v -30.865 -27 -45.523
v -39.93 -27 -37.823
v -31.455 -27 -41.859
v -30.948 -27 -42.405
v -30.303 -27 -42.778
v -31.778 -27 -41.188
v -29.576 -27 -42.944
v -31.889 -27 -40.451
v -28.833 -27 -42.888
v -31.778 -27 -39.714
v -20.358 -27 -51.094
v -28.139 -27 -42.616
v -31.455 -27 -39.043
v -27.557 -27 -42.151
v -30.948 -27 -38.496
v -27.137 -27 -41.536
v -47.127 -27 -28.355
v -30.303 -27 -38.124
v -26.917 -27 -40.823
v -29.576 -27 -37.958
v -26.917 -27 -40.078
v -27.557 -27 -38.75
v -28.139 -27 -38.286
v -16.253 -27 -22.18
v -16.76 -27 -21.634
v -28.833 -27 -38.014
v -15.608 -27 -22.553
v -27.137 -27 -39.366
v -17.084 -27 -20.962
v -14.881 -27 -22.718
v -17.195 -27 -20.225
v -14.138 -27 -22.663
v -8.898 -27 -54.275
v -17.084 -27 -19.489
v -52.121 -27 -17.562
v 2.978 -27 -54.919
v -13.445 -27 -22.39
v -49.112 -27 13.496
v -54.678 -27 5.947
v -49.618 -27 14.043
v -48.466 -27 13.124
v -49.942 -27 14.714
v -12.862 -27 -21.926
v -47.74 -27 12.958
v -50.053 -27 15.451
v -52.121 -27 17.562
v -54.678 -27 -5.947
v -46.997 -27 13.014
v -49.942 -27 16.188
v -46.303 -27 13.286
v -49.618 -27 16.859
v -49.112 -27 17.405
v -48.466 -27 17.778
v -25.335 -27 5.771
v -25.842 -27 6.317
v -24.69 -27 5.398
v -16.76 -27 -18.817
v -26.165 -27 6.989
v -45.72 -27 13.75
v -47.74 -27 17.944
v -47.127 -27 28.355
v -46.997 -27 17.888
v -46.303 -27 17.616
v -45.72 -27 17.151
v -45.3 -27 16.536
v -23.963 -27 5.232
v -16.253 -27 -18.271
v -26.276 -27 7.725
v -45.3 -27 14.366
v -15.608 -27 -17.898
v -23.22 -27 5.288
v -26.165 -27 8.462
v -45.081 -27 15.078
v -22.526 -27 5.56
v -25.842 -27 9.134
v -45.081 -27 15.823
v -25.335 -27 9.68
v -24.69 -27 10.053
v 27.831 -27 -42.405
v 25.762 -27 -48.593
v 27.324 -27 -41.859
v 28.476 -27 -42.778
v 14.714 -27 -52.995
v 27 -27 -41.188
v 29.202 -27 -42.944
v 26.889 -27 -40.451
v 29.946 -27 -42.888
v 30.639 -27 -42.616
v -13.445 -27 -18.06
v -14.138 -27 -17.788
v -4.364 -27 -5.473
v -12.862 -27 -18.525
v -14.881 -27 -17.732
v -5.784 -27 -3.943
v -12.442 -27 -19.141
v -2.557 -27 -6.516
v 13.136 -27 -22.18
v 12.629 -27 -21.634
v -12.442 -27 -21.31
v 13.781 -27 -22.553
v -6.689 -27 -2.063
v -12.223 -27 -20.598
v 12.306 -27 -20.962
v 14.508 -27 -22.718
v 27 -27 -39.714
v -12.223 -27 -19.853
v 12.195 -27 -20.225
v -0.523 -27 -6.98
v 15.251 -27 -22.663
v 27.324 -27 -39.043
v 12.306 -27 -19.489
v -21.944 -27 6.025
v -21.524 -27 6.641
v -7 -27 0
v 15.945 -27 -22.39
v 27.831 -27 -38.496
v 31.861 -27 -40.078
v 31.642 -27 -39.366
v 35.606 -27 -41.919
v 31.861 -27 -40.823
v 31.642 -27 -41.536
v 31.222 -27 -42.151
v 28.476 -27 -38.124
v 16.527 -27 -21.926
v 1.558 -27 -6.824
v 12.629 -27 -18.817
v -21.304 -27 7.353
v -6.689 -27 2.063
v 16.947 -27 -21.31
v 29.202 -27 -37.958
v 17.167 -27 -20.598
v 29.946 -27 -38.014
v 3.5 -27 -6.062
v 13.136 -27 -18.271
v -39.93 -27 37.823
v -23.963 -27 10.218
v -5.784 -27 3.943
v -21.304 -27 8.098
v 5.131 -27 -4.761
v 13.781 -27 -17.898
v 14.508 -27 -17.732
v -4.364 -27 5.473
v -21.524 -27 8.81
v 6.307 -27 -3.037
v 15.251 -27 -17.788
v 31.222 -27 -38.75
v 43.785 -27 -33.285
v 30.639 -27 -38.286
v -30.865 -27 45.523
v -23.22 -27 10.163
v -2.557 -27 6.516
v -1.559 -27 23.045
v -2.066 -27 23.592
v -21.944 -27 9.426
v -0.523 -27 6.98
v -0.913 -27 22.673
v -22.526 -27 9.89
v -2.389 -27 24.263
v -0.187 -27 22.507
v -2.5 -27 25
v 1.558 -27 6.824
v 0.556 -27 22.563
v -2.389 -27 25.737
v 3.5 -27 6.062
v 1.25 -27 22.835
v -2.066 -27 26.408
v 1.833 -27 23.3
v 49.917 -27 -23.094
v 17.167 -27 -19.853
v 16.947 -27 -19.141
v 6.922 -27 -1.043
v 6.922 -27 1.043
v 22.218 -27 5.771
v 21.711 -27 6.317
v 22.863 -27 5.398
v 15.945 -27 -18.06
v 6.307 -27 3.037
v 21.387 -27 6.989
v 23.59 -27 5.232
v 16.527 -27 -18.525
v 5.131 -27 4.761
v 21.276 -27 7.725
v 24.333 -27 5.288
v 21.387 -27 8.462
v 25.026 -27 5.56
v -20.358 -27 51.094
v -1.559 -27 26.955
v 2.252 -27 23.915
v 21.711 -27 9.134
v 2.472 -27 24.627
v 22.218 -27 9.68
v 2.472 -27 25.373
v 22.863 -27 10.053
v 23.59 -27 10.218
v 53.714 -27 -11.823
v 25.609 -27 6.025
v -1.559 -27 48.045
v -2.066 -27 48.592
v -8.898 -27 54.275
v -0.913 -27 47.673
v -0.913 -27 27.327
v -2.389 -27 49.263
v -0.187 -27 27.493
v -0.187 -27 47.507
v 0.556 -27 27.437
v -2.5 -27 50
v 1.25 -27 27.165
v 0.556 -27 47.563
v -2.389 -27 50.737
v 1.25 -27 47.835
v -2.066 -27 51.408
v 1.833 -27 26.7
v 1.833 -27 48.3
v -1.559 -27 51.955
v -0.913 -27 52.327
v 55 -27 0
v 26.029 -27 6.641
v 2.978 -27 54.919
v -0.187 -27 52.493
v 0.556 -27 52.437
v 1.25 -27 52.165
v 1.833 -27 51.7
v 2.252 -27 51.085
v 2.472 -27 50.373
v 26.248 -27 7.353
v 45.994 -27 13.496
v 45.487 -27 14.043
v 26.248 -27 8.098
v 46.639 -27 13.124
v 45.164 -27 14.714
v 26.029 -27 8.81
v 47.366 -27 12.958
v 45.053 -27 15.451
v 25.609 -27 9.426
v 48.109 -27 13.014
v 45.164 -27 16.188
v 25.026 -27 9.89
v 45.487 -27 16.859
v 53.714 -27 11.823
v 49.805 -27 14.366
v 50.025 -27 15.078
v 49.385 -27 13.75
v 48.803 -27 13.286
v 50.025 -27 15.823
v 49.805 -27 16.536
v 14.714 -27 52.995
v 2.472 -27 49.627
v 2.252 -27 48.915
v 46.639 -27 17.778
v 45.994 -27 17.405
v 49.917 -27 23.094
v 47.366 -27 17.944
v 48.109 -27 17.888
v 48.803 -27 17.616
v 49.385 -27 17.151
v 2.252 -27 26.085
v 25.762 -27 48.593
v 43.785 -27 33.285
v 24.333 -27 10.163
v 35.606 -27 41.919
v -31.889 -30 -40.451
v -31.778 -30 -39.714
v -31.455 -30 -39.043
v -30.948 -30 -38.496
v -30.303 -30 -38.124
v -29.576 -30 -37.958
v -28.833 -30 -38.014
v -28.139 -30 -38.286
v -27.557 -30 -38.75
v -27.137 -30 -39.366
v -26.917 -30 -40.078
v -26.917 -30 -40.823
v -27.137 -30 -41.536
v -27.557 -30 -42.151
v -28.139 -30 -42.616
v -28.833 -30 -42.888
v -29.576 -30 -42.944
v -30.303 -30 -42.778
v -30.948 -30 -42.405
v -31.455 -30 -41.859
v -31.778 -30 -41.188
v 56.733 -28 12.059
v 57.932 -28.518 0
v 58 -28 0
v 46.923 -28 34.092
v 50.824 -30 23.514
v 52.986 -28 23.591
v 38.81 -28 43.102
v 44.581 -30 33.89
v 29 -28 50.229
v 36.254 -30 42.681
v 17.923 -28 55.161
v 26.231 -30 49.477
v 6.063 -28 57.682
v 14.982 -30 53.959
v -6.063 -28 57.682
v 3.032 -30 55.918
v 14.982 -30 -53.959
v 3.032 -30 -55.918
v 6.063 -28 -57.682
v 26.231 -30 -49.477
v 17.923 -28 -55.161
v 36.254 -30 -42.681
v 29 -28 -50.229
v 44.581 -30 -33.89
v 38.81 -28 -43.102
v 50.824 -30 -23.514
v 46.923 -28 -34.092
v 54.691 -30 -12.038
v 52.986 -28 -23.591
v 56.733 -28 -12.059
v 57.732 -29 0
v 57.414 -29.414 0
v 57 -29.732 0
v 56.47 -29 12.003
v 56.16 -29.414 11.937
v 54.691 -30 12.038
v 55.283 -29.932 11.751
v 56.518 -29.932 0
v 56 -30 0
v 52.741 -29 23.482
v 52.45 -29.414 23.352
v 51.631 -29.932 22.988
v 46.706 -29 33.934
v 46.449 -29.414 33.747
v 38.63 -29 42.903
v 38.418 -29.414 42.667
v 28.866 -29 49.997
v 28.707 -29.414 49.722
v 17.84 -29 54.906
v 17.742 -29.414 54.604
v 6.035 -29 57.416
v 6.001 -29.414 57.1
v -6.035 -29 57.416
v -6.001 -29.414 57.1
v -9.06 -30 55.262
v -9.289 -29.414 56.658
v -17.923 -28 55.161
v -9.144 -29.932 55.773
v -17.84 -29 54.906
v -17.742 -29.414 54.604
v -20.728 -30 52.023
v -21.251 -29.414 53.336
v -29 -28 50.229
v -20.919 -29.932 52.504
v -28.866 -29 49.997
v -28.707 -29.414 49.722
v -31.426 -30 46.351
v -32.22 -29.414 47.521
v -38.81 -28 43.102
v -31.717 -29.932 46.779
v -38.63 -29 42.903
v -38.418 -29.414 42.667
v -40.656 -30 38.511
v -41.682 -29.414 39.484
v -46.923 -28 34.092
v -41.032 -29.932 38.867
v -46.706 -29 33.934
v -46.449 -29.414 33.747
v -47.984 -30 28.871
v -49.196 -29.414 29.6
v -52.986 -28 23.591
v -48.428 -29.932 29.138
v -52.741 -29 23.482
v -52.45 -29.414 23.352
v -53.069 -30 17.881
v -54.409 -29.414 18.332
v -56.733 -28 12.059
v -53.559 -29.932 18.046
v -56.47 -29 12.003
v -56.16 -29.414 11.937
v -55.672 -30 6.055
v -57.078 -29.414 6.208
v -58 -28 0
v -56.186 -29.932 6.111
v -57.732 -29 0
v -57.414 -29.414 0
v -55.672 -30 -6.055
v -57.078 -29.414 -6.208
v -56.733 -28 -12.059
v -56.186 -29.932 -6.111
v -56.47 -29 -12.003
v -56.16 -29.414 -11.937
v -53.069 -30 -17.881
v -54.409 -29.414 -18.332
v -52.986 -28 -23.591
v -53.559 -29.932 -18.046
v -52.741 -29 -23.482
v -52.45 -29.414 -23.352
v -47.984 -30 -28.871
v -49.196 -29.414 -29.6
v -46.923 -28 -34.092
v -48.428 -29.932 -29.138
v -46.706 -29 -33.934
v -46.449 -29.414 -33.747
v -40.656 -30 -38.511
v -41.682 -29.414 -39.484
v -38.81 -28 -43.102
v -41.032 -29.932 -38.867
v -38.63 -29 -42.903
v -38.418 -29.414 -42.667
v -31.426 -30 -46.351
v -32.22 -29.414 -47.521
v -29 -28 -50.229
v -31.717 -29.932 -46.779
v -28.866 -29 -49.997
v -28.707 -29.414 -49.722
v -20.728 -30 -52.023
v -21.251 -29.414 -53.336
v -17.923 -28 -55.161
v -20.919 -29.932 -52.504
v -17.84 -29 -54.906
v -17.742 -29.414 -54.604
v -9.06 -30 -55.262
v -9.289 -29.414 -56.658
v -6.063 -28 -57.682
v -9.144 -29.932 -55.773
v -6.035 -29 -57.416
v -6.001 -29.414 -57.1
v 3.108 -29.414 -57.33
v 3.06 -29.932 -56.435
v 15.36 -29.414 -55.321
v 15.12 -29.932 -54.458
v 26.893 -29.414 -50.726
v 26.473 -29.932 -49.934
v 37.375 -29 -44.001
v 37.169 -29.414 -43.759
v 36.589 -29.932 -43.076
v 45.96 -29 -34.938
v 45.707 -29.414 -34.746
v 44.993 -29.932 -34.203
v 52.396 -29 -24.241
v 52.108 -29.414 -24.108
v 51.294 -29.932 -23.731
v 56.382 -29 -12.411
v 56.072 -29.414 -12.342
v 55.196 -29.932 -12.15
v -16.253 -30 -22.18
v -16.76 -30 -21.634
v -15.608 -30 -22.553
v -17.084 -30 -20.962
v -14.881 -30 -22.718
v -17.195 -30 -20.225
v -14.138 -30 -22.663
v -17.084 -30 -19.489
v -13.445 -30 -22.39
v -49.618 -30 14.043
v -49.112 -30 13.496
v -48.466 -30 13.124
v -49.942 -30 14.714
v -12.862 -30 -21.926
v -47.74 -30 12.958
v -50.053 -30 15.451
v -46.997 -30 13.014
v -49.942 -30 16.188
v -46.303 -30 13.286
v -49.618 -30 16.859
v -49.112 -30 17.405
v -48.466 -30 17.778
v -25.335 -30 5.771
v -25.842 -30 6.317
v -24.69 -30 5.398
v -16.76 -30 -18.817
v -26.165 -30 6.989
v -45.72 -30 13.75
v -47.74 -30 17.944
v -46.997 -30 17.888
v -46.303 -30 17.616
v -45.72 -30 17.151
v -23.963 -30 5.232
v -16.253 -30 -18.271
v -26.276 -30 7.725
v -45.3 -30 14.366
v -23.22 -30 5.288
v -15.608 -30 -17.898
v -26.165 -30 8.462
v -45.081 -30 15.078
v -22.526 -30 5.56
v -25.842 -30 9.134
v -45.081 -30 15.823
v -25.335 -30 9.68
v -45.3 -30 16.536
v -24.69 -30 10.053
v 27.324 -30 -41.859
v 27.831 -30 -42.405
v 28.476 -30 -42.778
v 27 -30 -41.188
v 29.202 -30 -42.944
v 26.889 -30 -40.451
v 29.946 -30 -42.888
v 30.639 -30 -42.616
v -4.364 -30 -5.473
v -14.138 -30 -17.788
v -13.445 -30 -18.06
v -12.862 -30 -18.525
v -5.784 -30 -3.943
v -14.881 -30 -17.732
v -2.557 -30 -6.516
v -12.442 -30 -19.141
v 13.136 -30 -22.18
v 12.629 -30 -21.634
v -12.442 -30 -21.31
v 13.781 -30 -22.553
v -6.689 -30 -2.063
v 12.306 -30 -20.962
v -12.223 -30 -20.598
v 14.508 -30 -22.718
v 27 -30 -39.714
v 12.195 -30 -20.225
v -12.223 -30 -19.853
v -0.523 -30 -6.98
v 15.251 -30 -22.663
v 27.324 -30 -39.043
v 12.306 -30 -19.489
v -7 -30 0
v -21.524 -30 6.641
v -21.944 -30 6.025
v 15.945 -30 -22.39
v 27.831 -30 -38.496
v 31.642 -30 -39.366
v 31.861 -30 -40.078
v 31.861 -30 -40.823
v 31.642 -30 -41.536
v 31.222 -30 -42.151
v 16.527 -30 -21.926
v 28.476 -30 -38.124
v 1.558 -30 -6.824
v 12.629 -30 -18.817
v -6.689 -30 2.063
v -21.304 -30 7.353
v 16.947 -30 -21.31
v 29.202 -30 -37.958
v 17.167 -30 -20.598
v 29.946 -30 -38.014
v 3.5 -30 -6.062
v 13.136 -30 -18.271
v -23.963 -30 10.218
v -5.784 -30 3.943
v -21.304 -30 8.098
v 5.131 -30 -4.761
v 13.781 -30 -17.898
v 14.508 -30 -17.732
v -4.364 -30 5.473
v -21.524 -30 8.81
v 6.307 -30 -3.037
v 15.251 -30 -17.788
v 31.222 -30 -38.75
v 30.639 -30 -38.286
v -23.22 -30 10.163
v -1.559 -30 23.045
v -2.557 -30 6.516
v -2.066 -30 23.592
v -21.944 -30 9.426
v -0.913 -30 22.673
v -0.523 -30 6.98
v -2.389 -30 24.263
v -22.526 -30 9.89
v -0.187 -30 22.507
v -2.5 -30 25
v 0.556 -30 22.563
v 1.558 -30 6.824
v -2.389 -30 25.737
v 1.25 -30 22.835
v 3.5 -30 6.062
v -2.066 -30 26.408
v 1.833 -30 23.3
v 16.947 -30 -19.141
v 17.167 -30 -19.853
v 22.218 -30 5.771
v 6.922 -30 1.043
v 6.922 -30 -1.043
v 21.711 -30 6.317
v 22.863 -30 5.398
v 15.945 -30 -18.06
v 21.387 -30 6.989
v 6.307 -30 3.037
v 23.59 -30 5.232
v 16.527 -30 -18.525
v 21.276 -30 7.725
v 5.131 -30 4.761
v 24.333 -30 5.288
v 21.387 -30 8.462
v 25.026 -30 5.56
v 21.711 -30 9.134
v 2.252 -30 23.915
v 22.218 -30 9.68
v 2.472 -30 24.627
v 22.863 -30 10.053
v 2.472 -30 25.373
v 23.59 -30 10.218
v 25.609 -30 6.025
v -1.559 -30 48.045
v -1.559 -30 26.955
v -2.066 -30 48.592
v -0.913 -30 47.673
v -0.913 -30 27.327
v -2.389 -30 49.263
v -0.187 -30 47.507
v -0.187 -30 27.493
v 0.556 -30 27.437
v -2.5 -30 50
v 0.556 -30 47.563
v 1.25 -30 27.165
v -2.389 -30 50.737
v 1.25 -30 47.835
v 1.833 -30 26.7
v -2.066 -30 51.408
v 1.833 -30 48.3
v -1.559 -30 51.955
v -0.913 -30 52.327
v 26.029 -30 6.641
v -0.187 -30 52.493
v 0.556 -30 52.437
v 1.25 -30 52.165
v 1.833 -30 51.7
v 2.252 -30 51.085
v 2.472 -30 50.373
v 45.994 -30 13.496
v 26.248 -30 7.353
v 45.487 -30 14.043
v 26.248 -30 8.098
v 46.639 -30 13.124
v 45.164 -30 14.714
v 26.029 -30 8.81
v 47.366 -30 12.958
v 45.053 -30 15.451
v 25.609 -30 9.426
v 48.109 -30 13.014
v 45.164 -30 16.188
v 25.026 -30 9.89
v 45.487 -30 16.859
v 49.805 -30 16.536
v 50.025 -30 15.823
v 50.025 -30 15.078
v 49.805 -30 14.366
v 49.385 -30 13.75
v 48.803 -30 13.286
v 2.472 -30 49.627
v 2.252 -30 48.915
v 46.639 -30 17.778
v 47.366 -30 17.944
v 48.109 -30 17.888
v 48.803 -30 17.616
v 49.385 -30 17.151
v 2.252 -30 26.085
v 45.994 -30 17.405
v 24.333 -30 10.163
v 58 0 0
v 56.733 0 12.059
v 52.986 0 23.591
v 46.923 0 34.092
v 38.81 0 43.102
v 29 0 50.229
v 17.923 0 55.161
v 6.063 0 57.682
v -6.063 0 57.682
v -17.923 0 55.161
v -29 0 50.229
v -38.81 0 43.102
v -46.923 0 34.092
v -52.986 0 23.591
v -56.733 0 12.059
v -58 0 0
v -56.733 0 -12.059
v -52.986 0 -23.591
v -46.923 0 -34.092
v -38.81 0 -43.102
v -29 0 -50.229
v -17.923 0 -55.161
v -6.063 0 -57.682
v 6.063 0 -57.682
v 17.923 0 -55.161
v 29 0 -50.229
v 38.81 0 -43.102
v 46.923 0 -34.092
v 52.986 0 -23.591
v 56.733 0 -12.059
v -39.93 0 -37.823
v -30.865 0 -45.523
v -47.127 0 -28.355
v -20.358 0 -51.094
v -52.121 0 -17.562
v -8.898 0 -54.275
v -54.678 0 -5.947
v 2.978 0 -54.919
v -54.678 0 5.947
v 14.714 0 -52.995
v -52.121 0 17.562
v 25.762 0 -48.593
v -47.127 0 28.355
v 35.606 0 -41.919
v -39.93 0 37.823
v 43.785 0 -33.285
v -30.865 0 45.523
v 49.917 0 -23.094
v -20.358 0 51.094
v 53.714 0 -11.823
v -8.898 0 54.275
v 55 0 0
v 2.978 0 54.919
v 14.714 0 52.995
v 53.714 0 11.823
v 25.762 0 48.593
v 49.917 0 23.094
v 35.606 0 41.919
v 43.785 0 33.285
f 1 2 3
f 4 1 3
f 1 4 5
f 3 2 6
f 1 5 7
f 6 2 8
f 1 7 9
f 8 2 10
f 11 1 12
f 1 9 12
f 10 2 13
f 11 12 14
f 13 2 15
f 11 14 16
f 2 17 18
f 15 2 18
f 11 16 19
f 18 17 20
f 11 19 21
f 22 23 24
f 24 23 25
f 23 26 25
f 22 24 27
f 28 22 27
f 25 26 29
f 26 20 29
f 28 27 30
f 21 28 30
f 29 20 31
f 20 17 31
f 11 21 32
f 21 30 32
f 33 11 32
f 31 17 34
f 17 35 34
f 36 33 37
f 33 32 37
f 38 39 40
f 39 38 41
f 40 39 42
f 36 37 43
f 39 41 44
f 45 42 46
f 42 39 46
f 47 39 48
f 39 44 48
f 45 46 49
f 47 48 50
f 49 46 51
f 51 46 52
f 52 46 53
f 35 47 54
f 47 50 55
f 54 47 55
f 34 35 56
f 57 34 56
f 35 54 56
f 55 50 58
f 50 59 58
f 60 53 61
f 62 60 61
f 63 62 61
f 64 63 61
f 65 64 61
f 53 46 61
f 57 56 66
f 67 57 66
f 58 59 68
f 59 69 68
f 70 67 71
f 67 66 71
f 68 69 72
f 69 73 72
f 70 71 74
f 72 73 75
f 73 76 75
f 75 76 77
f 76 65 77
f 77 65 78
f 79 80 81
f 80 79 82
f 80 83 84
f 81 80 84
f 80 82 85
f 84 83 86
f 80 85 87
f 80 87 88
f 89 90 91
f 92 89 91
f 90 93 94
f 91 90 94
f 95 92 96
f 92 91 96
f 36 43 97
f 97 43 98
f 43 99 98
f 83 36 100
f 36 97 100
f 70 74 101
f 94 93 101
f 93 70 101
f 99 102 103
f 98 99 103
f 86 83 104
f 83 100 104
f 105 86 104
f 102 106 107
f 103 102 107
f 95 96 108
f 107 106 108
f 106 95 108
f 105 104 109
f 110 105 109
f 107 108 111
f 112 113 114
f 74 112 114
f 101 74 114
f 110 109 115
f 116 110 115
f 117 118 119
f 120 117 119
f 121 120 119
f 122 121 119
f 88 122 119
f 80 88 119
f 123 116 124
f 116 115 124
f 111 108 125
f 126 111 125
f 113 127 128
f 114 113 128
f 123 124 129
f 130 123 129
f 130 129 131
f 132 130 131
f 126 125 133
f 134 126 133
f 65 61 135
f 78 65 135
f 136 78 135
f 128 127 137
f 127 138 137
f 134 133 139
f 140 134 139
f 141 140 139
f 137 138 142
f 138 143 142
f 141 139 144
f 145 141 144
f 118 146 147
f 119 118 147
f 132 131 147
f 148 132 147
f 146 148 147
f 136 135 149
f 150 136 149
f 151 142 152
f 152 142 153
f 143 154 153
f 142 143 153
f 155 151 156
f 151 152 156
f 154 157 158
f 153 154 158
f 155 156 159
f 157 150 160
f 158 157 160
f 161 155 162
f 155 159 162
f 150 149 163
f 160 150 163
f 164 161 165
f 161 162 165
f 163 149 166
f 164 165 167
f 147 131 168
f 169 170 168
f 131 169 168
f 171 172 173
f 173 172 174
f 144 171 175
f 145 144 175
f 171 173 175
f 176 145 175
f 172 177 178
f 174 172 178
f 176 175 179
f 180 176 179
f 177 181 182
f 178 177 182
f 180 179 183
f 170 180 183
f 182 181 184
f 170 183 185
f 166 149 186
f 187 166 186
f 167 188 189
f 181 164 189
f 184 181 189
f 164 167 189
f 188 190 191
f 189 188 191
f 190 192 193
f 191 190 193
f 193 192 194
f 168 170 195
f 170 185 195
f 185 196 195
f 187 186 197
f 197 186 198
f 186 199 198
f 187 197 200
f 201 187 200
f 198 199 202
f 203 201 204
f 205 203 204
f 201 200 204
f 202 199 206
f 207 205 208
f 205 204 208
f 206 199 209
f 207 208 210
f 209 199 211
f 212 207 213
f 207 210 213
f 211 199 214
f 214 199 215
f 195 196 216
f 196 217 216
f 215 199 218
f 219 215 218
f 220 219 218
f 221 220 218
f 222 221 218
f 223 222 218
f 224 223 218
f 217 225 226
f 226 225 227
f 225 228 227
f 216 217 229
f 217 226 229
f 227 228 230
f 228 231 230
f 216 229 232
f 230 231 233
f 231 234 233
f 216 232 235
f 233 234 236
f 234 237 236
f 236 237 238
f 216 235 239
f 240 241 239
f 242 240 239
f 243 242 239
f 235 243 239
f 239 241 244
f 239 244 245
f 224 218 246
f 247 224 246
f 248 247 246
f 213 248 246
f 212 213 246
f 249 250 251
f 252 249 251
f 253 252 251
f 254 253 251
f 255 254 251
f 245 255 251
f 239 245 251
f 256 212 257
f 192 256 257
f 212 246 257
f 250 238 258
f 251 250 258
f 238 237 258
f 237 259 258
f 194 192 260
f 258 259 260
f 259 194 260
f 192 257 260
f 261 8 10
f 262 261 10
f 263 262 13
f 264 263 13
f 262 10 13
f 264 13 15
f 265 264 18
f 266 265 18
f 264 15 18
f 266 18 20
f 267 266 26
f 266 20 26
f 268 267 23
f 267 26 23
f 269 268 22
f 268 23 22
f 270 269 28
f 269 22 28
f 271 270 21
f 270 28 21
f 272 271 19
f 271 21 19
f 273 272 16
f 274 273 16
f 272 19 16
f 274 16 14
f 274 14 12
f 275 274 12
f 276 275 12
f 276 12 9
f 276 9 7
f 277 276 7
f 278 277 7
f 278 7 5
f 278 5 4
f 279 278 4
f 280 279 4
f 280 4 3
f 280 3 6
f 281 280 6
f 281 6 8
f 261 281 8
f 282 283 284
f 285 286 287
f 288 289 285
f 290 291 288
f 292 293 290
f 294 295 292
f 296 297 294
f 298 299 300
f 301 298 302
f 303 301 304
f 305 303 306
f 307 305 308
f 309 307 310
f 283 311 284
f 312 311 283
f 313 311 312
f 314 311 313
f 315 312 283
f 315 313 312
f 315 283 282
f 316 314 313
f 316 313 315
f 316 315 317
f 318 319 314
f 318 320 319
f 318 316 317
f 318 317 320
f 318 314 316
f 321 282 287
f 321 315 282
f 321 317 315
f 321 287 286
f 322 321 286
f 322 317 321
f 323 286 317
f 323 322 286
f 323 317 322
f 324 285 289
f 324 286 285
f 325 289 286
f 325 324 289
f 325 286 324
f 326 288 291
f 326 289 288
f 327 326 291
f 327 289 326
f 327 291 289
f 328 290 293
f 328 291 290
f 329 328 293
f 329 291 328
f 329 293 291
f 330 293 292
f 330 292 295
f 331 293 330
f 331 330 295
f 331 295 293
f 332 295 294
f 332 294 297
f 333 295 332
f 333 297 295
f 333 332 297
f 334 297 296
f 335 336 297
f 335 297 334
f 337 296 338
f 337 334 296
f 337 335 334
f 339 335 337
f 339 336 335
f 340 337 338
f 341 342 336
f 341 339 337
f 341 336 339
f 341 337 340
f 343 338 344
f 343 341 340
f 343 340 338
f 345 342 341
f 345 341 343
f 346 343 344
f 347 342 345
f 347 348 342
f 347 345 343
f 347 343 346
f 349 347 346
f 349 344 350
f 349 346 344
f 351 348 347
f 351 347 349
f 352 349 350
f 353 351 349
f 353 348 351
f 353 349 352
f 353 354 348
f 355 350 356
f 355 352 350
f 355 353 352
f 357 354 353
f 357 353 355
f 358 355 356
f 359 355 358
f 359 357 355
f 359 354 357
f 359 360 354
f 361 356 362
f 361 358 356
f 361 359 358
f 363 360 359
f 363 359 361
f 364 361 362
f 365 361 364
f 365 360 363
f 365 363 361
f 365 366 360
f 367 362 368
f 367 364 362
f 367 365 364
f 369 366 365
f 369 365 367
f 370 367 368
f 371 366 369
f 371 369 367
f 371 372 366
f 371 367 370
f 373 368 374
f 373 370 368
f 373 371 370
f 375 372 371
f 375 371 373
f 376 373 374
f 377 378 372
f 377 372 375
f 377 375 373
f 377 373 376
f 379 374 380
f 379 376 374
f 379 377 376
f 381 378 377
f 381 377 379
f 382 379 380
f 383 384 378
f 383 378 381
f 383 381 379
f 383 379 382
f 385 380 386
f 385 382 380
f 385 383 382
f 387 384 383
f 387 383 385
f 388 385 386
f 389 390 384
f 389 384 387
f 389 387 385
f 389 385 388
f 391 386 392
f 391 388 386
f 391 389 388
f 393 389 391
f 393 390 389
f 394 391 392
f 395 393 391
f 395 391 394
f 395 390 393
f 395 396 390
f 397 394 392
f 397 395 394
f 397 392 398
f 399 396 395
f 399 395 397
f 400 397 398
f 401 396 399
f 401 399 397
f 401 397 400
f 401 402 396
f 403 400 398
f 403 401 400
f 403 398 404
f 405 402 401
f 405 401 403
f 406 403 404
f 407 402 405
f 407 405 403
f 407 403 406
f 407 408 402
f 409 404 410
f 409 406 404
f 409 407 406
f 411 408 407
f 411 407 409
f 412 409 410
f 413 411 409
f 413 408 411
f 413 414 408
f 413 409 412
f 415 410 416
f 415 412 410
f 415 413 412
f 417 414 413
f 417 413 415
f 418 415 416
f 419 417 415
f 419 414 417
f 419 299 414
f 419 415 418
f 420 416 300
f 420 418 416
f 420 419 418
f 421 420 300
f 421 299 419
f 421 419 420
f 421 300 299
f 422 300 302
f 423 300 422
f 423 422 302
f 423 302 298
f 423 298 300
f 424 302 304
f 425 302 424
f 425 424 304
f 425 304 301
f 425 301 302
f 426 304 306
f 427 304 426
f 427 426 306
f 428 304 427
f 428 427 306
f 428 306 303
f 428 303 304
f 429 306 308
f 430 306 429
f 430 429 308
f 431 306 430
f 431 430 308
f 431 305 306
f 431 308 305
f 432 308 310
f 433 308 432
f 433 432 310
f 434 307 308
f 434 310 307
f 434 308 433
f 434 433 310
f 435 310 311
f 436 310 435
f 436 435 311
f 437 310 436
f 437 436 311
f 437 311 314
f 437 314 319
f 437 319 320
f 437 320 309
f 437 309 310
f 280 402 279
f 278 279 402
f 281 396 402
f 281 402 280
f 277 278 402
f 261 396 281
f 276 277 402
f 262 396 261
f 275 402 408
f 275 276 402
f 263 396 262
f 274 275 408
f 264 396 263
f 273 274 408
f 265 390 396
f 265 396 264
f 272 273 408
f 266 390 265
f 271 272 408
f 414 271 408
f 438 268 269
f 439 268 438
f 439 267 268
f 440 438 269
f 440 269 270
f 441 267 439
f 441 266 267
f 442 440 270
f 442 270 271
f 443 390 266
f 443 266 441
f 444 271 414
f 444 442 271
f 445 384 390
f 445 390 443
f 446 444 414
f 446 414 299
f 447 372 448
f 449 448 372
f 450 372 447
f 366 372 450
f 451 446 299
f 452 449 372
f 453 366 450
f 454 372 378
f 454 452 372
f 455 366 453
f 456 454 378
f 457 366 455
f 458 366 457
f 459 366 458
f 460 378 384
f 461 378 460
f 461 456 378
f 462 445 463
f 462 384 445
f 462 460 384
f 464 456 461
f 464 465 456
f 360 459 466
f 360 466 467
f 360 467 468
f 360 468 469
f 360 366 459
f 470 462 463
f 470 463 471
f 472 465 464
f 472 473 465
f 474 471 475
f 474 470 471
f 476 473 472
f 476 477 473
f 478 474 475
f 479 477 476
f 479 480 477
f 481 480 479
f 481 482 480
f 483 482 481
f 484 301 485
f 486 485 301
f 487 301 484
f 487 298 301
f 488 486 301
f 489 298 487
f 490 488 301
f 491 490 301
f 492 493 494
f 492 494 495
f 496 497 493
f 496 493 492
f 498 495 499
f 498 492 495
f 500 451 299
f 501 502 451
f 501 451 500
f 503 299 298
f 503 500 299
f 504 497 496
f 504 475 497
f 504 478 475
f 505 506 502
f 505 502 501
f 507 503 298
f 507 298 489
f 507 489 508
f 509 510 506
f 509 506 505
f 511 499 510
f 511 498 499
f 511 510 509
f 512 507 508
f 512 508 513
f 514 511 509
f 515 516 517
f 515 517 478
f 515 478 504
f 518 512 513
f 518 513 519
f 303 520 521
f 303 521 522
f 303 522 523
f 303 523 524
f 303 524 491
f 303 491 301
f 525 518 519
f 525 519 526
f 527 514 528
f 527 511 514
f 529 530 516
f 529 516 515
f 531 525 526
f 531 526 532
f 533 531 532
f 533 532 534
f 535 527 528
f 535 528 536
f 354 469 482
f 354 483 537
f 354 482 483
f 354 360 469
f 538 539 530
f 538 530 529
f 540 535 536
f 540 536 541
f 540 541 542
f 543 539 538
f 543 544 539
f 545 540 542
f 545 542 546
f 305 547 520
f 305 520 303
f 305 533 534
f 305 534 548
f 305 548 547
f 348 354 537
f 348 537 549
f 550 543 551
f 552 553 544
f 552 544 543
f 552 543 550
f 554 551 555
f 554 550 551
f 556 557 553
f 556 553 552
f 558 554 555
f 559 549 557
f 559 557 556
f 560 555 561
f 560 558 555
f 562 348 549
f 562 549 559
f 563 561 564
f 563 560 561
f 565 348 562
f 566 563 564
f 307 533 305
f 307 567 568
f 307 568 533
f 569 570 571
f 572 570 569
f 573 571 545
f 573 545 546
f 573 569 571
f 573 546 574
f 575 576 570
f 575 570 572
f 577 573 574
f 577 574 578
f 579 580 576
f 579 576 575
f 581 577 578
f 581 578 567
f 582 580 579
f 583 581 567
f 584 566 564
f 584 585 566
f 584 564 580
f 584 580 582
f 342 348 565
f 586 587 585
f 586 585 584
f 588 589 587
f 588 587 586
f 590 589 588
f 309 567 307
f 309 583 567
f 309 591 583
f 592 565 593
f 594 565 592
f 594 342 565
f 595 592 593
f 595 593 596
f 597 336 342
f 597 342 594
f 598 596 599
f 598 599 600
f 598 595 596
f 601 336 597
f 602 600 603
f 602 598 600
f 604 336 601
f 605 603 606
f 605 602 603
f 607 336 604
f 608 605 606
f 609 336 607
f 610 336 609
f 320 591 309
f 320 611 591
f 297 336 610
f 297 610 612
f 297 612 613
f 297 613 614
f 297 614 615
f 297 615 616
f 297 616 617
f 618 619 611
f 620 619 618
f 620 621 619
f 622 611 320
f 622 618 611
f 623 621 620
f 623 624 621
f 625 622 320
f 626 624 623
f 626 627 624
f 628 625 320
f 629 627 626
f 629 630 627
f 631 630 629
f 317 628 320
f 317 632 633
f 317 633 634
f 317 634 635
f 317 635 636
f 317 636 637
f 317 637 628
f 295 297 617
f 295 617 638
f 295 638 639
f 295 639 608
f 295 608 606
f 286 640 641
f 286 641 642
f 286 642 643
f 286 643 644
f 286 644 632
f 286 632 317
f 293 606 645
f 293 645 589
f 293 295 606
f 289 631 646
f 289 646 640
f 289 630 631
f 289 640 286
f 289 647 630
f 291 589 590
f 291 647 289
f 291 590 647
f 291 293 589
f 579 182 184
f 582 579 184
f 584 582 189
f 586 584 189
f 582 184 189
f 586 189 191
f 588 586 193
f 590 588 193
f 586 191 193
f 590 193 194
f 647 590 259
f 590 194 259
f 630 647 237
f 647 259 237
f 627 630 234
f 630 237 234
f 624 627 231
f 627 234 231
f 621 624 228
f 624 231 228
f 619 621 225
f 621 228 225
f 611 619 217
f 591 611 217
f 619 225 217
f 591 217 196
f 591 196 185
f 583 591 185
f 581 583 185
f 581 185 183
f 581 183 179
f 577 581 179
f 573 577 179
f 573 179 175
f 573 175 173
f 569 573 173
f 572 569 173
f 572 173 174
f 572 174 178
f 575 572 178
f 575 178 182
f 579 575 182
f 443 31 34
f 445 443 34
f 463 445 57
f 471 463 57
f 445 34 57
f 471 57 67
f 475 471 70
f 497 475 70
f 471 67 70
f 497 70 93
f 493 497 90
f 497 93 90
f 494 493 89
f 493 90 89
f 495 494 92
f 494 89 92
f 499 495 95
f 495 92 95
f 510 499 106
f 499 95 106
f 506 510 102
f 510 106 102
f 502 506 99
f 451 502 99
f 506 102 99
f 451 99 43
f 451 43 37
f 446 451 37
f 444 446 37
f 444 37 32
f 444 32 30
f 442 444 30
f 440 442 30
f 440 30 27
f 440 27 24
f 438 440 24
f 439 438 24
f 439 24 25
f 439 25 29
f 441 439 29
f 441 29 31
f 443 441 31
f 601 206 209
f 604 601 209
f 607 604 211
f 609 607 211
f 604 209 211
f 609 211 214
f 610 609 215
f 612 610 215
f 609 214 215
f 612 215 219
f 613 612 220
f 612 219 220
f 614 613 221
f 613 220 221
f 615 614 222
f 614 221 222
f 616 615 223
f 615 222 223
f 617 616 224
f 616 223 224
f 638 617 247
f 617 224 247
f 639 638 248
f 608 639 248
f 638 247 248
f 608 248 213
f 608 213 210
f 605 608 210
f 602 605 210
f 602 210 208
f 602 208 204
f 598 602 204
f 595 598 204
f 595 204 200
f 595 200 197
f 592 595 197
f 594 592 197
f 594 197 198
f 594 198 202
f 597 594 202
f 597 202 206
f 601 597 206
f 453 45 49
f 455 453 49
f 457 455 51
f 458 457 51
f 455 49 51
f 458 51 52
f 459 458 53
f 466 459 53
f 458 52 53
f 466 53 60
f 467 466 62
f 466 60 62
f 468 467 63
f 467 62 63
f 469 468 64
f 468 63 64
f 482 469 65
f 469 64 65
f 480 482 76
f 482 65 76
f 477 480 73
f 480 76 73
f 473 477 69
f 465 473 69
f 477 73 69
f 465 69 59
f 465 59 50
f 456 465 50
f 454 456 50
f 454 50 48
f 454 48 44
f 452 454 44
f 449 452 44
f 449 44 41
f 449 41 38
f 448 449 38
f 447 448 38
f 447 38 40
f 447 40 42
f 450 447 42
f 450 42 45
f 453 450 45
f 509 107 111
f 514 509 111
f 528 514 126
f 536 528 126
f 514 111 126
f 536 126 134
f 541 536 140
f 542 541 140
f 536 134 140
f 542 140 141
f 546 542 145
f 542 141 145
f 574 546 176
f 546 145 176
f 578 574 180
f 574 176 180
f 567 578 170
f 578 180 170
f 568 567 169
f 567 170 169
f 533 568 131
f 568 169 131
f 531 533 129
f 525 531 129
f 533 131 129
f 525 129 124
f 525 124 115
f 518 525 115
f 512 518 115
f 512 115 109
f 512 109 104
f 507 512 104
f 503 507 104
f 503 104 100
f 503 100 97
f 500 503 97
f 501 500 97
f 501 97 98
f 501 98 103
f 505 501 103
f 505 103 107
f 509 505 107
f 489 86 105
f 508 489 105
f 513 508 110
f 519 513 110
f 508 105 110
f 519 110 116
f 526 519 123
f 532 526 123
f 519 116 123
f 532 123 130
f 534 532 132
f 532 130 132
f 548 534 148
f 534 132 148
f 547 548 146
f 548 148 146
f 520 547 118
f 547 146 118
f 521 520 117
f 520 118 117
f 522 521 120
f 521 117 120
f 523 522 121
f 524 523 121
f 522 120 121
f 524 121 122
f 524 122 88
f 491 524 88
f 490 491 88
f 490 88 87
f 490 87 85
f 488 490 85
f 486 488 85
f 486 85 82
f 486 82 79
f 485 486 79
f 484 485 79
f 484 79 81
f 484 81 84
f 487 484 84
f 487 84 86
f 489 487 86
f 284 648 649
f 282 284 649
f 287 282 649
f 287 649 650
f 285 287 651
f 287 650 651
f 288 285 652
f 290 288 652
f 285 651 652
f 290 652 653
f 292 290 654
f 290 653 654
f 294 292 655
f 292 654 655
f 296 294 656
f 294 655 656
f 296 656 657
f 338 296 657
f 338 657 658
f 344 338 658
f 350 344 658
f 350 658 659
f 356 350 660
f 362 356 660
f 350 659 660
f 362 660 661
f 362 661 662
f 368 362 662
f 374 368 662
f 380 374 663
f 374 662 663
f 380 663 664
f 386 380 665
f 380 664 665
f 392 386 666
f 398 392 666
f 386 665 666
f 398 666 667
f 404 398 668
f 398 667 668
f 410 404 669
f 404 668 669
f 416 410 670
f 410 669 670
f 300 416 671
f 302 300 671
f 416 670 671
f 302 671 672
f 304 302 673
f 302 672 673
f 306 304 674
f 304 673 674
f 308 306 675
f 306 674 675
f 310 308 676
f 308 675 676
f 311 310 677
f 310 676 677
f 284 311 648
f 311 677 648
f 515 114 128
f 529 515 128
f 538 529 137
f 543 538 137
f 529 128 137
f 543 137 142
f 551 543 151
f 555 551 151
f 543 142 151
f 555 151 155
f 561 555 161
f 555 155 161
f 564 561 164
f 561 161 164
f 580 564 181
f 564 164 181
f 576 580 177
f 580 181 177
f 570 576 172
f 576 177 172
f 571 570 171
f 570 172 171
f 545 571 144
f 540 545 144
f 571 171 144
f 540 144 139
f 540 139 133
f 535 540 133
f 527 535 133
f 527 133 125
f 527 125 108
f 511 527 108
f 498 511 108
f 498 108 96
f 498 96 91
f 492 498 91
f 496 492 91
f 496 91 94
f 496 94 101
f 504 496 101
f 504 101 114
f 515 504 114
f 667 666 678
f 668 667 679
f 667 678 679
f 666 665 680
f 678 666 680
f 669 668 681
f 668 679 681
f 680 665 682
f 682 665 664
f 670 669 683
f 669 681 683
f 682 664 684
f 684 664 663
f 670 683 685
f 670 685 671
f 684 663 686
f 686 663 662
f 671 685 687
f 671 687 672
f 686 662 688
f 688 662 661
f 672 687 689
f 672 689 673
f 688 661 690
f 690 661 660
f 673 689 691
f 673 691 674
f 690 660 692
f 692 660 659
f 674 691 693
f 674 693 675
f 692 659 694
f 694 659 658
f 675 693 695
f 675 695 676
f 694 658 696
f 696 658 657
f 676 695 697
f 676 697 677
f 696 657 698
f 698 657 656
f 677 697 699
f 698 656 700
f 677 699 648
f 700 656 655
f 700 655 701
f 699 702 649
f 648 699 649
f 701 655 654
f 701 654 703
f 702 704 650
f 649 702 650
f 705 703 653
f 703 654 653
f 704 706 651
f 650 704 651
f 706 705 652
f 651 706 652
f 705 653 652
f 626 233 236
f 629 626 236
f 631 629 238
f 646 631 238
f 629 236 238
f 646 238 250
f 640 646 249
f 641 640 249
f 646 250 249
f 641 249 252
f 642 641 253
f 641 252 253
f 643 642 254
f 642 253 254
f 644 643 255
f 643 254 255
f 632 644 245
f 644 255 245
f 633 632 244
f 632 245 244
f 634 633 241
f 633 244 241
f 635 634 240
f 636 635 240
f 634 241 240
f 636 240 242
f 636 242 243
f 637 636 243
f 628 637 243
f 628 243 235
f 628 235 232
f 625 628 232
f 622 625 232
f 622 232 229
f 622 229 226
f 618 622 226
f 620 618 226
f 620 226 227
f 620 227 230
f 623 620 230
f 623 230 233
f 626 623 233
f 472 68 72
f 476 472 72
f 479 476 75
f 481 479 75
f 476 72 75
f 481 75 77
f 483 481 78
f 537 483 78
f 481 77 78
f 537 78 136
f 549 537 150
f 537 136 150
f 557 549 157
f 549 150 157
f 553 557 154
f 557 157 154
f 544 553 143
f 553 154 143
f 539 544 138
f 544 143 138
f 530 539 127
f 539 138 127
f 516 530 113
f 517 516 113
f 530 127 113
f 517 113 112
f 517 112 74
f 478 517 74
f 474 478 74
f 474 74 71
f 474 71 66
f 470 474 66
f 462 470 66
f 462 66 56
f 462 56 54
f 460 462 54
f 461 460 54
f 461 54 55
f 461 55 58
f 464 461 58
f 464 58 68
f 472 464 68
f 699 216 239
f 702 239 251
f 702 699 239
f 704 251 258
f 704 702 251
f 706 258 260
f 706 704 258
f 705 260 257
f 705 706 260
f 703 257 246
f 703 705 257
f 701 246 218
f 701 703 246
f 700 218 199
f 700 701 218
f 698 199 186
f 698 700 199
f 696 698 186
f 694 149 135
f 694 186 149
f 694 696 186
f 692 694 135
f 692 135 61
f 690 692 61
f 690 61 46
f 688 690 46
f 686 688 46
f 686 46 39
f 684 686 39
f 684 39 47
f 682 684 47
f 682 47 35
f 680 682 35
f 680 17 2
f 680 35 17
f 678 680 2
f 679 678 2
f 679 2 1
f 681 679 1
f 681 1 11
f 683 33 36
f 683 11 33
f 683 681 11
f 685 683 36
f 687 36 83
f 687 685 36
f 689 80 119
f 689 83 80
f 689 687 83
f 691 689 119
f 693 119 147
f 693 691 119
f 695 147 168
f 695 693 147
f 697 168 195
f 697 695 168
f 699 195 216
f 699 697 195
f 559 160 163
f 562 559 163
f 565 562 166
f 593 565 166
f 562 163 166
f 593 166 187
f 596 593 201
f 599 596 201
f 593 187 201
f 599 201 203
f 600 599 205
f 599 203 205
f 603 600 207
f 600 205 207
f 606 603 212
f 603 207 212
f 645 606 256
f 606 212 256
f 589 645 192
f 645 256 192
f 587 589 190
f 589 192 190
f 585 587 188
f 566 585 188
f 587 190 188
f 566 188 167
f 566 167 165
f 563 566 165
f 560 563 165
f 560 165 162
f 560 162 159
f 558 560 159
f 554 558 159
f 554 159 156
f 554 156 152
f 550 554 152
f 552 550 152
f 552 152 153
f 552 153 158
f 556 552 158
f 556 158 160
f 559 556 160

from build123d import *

# Parameters (mm, degrees)
F0_R     = 58
F1_DEPTH = 30
F2_T     = -3
F3_R     = 2
F5_D     = 14
F7_D     = 5


with BuildPart() as f1:
    # F0 (on Front) → F1 (new body)
    with BuildSketch(Plane.XZ):
        Circle(F0_R)
    extrude(amount=F1_DEPTH)

    # F2
    f2_openings = [f1.faces().sort_by_distance(p)[0] for p in [
        (0, 0, 0),
    ]]
    offset(amount=F2_T, openings=f2_openings)

    # F3
    f3_edges = [f1.edges().sort_by_distance(p)[0] for p in [
        (-58, -30, 0),
    ]]
    fillet(f3_edges, radius=F3_R)

    # F5 (through all)
    with Locations(Plane.XZ.offset(30)):
        with Locations((0, 0)):
            Hole(F5_D / 2)

    # F7 (through all)
    with Locations(Plane.XZ.offset(30)):
        with Locations((0, 25), (0, 50), (-23.776413, 7.725425), (-47.552826, 15.45085), (-29.389263, -40.45085), (-14.694631, -20.225425), (14.694631, -20.225425), (29.389263, -40.45085), (23.776413, 7.725425), (47.552826, 15.45085)):
            Hole(F7_D / 2)


solid = f1.part
